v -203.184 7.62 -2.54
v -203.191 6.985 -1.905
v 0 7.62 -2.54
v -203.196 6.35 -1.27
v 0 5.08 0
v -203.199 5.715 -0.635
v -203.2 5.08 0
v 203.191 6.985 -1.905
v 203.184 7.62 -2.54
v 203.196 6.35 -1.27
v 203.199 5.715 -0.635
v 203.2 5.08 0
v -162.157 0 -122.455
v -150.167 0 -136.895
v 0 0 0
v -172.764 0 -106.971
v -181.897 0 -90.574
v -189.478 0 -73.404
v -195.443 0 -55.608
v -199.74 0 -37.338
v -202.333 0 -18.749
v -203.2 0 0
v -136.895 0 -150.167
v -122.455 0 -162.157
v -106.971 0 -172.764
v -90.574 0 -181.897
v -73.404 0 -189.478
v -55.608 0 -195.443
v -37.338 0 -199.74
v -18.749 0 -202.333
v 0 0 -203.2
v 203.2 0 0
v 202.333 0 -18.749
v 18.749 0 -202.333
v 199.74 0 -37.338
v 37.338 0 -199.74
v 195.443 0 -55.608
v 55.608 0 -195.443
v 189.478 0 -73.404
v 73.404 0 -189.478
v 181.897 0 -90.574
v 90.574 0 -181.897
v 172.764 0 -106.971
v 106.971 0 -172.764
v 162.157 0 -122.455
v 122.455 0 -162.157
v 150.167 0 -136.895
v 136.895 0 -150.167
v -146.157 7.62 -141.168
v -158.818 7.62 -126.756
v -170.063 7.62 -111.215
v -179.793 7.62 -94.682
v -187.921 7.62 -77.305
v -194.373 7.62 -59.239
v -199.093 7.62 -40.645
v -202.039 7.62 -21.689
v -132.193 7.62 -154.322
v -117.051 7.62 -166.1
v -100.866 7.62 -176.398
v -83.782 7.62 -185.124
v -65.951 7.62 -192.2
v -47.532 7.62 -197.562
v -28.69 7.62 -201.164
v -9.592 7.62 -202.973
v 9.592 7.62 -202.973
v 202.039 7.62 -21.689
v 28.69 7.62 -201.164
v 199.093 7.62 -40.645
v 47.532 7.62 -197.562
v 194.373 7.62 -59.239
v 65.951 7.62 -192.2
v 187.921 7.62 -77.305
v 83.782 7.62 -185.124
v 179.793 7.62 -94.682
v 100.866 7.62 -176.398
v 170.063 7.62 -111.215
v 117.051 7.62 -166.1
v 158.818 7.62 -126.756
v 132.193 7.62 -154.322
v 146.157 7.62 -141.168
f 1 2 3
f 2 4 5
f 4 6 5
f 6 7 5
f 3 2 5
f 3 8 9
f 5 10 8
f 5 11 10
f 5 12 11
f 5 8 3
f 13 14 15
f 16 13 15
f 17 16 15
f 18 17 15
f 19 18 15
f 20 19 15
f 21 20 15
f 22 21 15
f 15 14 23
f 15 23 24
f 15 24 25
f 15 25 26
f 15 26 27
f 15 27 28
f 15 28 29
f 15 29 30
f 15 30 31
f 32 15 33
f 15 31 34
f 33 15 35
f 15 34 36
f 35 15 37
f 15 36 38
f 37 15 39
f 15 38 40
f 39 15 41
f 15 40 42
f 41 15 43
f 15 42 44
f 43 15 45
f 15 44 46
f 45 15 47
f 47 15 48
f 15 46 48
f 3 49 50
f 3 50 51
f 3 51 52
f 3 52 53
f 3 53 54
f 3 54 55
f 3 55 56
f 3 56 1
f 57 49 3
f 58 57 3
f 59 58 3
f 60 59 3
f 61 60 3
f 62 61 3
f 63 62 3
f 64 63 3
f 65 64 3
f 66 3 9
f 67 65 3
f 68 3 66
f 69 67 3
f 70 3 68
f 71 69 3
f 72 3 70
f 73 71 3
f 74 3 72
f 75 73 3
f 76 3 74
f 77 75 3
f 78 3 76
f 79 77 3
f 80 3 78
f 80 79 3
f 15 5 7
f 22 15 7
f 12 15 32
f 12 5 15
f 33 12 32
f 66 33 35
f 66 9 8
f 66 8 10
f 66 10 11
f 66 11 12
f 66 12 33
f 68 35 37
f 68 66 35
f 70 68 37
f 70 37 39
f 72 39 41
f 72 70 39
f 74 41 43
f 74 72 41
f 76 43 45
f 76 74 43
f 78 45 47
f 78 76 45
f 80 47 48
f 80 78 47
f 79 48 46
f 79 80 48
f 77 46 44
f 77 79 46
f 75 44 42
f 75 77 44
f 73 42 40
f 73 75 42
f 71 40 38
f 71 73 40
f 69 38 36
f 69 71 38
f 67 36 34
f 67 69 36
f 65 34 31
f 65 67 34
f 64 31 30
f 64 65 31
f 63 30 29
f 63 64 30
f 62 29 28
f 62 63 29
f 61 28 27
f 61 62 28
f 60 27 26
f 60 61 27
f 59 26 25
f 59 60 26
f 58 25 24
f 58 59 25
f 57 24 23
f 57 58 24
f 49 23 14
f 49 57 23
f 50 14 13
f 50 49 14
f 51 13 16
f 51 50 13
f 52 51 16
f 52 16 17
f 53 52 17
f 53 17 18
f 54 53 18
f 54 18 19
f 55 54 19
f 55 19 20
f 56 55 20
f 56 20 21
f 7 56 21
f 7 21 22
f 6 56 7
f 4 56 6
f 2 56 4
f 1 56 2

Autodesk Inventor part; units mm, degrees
ref_plane "YZ Plane" through (0, 0, 0) normal (1, 0, 0) x (0, 1, 0)
ref_plane "XZ Plane" through (0, 0, 0) normal (0, 1, 0) x (-1, 0, 0)
ref_plane "XY Plane" through (0, 0, 0) normal (0, 0, 1) x (1, 0, 0)
sketch "Sketch1" plane through (0, 0, 0) normal (0, 0, 1) x (1, 0, 0)
  line L0 (0, 0) -> (203.2, 0)
  line L1 (203.2, 0) -> (203.2, 7.62)
  line L2 (203.2, 7.62) -> (0, 7.62)
  line L3 (0, 7.62) -> (0, 0)
  dimension "d0" = 7.62
  dimension "d1" = 203.2
revolve "Revolution1" add sketch "Sketch1" angle 180 about axis through (0, 7.62, 0) along (0, 1, 0)
chamfer "Chamfer1" distance 2.54 angle 45 1 edges at (-101.6, 7.62, 0)
properties part number "shelf-backplate"
